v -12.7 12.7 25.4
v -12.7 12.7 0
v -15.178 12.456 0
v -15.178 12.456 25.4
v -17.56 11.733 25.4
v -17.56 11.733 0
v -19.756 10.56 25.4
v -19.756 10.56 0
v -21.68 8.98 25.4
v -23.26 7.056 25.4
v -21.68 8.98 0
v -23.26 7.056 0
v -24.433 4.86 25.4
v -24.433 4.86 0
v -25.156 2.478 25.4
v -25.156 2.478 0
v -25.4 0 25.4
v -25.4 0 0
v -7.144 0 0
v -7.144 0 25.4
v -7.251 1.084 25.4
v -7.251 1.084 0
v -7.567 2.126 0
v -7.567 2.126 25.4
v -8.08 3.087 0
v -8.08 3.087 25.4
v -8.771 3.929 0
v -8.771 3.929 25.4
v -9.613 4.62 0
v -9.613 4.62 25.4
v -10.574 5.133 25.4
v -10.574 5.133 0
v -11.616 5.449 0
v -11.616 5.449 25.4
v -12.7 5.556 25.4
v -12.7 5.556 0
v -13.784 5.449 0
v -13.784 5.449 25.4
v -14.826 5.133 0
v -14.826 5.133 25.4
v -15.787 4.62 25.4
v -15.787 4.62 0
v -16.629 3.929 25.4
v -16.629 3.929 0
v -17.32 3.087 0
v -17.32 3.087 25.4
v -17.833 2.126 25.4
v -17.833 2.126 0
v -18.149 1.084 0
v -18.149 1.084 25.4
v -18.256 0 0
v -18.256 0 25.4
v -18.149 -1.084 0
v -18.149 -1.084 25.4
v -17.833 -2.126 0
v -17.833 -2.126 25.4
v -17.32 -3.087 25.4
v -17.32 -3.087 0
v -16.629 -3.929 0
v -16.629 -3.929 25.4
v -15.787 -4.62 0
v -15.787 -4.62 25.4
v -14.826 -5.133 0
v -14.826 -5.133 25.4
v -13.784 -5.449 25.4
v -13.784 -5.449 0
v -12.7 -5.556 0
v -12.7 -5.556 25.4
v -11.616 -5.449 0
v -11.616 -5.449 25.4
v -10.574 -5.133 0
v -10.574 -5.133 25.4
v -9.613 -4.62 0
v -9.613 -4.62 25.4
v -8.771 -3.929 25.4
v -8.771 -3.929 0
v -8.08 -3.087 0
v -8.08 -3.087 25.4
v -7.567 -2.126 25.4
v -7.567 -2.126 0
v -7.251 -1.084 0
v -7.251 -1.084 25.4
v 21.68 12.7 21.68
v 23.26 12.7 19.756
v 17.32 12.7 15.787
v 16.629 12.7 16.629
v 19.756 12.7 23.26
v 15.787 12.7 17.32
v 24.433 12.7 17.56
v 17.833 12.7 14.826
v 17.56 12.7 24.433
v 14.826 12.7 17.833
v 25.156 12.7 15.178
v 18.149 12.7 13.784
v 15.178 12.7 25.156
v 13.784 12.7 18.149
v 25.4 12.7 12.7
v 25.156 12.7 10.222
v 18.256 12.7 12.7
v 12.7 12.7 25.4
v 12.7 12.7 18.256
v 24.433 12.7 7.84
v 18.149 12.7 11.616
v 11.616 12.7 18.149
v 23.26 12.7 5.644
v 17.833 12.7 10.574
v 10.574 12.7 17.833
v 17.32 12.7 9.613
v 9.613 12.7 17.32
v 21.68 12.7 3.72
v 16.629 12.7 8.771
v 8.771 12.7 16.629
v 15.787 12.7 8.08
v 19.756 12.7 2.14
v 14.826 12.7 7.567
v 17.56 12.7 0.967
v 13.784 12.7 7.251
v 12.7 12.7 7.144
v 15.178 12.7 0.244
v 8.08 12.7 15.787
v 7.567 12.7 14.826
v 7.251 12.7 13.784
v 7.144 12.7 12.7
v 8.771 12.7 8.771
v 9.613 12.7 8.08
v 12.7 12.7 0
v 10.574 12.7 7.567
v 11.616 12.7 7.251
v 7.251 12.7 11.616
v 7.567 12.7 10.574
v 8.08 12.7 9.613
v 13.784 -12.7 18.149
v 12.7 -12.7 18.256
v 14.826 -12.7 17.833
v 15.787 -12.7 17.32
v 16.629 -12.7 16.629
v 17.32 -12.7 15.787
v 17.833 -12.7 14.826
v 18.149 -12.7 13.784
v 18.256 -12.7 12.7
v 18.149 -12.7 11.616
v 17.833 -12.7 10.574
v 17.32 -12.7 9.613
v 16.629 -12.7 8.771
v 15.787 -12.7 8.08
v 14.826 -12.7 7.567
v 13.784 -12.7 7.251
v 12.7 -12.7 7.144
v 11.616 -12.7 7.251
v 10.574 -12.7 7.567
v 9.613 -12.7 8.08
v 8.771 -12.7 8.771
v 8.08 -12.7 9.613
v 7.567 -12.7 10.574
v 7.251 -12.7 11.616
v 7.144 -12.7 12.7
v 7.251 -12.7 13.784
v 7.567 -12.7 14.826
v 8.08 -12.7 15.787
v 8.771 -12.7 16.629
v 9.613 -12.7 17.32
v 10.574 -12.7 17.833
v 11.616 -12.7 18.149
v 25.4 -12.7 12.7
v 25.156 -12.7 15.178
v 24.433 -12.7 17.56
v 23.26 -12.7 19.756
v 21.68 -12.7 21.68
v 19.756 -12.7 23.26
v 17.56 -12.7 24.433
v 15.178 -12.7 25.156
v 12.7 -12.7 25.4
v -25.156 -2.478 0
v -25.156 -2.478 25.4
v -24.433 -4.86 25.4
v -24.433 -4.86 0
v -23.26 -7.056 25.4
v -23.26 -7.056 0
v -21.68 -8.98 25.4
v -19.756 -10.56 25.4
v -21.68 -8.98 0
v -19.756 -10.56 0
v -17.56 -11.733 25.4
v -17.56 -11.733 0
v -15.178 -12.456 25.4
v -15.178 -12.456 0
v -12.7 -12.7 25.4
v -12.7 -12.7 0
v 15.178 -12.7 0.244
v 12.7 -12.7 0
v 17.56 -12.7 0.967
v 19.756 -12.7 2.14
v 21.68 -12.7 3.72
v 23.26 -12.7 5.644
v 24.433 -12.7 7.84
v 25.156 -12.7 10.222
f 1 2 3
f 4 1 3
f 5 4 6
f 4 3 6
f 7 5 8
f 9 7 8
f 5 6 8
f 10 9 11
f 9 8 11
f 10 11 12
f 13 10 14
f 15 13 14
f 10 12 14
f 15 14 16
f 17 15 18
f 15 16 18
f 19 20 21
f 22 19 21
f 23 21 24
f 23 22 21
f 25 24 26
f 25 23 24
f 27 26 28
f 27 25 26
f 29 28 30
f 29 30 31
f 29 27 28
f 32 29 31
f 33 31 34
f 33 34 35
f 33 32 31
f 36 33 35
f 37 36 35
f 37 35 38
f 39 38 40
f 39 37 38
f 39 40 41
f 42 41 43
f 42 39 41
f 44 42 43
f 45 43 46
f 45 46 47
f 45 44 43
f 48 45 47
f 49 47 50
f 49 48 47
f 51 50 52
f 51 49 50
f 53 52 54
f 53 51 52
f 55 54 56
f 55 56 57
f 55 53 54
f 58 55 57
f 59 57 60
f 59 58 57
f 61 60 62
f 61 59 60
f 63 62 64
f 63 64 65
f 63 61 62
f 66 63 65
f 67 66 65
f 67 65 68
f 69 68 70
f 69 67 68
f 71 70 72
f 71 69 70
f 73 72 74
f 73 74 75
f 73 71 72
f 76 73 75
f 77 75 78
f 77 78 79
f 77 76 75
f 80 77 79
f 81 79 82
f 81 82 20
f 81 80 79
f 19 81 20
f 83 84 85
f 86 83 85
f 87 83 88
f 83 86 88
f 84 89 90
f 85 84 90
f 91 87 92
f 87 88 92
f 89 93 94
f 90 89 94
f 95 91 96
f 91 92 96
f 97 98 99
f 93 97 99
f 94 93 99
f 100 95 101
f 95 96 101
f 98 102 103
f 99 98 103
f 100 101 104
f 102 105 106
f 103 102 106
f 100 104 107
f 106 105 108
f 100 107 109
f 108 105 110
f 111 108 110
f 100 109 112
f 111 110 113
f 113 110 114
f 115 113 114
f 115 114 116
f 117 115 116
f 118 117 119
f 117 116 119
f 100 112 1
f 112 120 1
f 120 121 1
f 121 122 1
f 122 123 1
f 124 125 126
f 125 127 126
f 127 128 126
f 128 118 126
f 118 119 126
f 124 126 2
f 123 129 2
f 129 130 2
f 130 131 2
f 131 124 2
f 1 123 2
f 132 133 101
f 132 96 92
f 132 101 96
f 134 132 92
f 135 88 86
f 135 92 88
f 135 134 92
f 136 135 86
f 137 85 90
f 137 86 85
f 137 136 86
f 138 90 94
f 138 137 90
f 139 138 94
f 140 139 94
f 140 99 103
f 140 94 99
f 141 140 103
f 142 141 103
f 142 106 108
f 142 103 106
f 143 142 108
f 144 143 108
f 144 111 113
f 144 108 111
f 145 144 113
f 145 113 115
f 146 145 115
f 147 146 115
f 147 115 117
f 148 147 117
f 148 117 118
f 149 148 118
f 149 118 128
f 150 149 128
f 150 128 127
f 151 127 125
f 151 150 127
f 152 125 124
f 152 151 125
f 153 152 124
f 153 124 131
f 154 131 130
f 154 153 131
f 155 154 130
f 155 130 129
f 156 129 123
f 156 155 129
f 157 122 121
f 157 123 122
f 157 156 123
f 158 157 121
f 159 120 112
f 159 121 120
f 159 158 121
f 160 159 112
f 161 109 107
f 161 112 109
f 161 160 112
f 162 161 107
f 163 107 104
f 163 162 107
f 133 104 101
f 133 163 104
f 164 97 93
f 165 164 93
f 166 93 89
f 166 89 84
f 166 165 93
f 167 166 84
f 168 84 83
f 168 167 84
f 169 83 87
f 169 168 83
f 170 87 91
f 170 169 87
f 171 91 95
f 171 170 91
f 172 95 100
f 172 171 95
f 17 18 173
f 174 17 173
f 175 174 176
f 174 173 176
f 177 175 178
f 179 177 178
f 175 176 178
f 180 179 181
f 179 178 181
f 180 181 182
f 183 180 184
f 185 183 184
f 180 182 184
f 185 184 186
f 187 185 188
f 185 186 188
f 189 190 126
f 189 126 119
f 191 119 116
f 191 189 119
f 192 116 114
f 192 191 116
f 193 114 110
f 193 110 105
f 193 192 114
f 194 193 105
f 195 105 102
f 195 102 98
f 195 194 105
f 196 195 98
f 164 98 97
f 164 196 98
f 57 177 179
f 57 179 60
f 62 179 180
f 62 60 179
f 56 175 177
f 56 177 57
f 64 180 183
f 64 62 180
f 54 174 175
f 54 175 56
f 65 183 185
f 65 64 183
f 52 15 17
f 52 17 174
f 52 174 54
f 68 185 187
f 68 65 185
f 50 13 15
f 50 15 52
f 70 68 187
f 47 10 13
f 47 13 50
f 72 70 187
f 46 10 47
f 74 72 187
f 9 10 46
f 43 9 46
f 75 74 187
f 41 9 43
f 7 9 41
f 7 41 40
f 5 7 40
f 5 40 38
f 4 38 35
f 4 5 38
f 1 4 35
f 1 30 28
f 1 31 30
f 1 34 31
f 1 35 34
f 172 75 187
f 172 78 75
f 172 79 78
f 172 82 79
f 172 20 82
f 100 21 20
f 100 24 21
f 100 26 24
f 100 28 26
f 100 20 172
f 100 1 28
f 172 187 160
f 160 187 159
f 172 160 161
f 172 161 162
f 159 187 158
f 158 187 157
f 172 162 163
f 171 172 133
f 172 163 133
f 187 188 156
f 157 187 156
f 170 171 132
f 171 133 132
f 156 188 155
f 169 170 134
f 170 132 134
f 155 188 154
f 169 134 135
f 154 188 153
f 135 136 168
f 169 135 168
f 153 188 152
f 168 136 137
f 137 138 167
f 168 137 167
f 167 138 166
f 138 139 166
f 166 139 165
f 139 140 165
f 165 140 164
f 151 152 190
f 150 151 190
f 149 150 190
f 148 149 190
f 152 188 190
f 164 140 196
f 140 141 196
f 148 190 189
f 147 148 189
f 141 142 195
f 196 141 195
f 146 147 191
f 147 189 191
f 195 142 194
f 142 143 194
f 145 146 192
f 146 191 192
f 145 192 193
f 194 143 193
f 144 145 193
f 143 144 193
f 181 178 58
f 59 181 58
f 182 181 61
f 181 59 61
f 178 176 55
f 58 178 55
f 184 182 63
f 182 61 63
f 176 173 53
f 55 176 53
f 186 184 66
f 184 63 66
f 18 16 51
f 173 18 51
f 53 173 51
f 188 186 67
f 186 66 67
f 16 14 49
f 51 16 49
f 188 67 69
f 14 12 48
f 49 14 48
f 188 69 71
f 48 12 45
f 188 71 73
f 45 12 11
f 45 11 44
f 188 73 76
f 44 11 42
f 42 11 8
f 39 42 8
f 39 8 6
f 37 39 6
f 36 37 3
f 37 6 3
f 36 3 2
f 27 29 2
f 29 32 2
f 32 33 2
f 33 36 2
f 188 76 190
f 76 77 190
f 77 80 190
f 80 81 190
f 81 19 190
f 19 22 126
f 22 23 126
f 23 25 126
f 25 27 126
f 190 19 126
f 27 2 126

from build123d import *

# Parameters (mm, degrees)
SKETCH1_R               = 5.55625
BOSS_EXTRUDE1_DEPTH     = 25.4
CUT_EXTRUDE1_DEPTH      = 44.994090512
CUT_EXTRUDE1_DEPTH_BACK = 44.994090512
SKETCH2_R               = 5.55625


with BuildPart() as part:
    # Sketch1 → Boss-Extrude1 (new body)
    with BuildSketch(Plane.XY):
        with BuildLine():
            ThreePointArc((-25.4, 0), (-21.680256121, -8.980256121), (-12.7, -12.7))
            Line((-12.7, -12.7), (25.4, -12.7))
            Line((25.4, -12.7), (25.4, 12.7))
            Line((25.4, 12.7), (-12.7, 12.7))
            ThreePointArc((-12.7, 12.7), (-21.680256121, 8.980256121), (-25.4, 0))
        make_face()
        with Locations((-12.7, 0)):
            Circle(SKETCH1_R, mode=Mode.SUBTRACT)
    extrude(amount=BOSS_EXTRUDE1_DEPTH)

    # Sketch2 → Cut-Extrude1 (cut, two sides: drawn at the far end of the back side and taken through both)
    with BuildSketch(Plane(origin=(0, 12.7, 0), x_dir=(1, 0, 0), z_dir=(0, 1, 0)).offset(-CUT_EXTRUDE1_DEPTH_BACK)):
        with Locations(Location((12.7, -12.7, 0), (0, 0, 270))):
            Circle(SKETCH2_R)
        with BuildLine():
            Line((25.4, 0), (12.7, 0))
            ThreePointArc((12.7, 0), (21.680256121, -3.719743879), (25.4, -12.7))
            Line((25.4, -12.7), (25.4, 0))
        make_face()
        with BuildLine():
            Line((25.4, -25.4), (25.4, -12.7))
            ThreePointArc((25.4, -12.7), (21.680256121, -21.680256121), (12.7, -25.4))
            Line((12.7, -25.4), (25.4, -25.4))
        make_face()
    extrude(amount=CUT_EXTRUDE1_DEPTH + CUT_EXTRUDE1_DEPTH_BACK, mode=Mode.SUBTRACT)


solid = part.part
